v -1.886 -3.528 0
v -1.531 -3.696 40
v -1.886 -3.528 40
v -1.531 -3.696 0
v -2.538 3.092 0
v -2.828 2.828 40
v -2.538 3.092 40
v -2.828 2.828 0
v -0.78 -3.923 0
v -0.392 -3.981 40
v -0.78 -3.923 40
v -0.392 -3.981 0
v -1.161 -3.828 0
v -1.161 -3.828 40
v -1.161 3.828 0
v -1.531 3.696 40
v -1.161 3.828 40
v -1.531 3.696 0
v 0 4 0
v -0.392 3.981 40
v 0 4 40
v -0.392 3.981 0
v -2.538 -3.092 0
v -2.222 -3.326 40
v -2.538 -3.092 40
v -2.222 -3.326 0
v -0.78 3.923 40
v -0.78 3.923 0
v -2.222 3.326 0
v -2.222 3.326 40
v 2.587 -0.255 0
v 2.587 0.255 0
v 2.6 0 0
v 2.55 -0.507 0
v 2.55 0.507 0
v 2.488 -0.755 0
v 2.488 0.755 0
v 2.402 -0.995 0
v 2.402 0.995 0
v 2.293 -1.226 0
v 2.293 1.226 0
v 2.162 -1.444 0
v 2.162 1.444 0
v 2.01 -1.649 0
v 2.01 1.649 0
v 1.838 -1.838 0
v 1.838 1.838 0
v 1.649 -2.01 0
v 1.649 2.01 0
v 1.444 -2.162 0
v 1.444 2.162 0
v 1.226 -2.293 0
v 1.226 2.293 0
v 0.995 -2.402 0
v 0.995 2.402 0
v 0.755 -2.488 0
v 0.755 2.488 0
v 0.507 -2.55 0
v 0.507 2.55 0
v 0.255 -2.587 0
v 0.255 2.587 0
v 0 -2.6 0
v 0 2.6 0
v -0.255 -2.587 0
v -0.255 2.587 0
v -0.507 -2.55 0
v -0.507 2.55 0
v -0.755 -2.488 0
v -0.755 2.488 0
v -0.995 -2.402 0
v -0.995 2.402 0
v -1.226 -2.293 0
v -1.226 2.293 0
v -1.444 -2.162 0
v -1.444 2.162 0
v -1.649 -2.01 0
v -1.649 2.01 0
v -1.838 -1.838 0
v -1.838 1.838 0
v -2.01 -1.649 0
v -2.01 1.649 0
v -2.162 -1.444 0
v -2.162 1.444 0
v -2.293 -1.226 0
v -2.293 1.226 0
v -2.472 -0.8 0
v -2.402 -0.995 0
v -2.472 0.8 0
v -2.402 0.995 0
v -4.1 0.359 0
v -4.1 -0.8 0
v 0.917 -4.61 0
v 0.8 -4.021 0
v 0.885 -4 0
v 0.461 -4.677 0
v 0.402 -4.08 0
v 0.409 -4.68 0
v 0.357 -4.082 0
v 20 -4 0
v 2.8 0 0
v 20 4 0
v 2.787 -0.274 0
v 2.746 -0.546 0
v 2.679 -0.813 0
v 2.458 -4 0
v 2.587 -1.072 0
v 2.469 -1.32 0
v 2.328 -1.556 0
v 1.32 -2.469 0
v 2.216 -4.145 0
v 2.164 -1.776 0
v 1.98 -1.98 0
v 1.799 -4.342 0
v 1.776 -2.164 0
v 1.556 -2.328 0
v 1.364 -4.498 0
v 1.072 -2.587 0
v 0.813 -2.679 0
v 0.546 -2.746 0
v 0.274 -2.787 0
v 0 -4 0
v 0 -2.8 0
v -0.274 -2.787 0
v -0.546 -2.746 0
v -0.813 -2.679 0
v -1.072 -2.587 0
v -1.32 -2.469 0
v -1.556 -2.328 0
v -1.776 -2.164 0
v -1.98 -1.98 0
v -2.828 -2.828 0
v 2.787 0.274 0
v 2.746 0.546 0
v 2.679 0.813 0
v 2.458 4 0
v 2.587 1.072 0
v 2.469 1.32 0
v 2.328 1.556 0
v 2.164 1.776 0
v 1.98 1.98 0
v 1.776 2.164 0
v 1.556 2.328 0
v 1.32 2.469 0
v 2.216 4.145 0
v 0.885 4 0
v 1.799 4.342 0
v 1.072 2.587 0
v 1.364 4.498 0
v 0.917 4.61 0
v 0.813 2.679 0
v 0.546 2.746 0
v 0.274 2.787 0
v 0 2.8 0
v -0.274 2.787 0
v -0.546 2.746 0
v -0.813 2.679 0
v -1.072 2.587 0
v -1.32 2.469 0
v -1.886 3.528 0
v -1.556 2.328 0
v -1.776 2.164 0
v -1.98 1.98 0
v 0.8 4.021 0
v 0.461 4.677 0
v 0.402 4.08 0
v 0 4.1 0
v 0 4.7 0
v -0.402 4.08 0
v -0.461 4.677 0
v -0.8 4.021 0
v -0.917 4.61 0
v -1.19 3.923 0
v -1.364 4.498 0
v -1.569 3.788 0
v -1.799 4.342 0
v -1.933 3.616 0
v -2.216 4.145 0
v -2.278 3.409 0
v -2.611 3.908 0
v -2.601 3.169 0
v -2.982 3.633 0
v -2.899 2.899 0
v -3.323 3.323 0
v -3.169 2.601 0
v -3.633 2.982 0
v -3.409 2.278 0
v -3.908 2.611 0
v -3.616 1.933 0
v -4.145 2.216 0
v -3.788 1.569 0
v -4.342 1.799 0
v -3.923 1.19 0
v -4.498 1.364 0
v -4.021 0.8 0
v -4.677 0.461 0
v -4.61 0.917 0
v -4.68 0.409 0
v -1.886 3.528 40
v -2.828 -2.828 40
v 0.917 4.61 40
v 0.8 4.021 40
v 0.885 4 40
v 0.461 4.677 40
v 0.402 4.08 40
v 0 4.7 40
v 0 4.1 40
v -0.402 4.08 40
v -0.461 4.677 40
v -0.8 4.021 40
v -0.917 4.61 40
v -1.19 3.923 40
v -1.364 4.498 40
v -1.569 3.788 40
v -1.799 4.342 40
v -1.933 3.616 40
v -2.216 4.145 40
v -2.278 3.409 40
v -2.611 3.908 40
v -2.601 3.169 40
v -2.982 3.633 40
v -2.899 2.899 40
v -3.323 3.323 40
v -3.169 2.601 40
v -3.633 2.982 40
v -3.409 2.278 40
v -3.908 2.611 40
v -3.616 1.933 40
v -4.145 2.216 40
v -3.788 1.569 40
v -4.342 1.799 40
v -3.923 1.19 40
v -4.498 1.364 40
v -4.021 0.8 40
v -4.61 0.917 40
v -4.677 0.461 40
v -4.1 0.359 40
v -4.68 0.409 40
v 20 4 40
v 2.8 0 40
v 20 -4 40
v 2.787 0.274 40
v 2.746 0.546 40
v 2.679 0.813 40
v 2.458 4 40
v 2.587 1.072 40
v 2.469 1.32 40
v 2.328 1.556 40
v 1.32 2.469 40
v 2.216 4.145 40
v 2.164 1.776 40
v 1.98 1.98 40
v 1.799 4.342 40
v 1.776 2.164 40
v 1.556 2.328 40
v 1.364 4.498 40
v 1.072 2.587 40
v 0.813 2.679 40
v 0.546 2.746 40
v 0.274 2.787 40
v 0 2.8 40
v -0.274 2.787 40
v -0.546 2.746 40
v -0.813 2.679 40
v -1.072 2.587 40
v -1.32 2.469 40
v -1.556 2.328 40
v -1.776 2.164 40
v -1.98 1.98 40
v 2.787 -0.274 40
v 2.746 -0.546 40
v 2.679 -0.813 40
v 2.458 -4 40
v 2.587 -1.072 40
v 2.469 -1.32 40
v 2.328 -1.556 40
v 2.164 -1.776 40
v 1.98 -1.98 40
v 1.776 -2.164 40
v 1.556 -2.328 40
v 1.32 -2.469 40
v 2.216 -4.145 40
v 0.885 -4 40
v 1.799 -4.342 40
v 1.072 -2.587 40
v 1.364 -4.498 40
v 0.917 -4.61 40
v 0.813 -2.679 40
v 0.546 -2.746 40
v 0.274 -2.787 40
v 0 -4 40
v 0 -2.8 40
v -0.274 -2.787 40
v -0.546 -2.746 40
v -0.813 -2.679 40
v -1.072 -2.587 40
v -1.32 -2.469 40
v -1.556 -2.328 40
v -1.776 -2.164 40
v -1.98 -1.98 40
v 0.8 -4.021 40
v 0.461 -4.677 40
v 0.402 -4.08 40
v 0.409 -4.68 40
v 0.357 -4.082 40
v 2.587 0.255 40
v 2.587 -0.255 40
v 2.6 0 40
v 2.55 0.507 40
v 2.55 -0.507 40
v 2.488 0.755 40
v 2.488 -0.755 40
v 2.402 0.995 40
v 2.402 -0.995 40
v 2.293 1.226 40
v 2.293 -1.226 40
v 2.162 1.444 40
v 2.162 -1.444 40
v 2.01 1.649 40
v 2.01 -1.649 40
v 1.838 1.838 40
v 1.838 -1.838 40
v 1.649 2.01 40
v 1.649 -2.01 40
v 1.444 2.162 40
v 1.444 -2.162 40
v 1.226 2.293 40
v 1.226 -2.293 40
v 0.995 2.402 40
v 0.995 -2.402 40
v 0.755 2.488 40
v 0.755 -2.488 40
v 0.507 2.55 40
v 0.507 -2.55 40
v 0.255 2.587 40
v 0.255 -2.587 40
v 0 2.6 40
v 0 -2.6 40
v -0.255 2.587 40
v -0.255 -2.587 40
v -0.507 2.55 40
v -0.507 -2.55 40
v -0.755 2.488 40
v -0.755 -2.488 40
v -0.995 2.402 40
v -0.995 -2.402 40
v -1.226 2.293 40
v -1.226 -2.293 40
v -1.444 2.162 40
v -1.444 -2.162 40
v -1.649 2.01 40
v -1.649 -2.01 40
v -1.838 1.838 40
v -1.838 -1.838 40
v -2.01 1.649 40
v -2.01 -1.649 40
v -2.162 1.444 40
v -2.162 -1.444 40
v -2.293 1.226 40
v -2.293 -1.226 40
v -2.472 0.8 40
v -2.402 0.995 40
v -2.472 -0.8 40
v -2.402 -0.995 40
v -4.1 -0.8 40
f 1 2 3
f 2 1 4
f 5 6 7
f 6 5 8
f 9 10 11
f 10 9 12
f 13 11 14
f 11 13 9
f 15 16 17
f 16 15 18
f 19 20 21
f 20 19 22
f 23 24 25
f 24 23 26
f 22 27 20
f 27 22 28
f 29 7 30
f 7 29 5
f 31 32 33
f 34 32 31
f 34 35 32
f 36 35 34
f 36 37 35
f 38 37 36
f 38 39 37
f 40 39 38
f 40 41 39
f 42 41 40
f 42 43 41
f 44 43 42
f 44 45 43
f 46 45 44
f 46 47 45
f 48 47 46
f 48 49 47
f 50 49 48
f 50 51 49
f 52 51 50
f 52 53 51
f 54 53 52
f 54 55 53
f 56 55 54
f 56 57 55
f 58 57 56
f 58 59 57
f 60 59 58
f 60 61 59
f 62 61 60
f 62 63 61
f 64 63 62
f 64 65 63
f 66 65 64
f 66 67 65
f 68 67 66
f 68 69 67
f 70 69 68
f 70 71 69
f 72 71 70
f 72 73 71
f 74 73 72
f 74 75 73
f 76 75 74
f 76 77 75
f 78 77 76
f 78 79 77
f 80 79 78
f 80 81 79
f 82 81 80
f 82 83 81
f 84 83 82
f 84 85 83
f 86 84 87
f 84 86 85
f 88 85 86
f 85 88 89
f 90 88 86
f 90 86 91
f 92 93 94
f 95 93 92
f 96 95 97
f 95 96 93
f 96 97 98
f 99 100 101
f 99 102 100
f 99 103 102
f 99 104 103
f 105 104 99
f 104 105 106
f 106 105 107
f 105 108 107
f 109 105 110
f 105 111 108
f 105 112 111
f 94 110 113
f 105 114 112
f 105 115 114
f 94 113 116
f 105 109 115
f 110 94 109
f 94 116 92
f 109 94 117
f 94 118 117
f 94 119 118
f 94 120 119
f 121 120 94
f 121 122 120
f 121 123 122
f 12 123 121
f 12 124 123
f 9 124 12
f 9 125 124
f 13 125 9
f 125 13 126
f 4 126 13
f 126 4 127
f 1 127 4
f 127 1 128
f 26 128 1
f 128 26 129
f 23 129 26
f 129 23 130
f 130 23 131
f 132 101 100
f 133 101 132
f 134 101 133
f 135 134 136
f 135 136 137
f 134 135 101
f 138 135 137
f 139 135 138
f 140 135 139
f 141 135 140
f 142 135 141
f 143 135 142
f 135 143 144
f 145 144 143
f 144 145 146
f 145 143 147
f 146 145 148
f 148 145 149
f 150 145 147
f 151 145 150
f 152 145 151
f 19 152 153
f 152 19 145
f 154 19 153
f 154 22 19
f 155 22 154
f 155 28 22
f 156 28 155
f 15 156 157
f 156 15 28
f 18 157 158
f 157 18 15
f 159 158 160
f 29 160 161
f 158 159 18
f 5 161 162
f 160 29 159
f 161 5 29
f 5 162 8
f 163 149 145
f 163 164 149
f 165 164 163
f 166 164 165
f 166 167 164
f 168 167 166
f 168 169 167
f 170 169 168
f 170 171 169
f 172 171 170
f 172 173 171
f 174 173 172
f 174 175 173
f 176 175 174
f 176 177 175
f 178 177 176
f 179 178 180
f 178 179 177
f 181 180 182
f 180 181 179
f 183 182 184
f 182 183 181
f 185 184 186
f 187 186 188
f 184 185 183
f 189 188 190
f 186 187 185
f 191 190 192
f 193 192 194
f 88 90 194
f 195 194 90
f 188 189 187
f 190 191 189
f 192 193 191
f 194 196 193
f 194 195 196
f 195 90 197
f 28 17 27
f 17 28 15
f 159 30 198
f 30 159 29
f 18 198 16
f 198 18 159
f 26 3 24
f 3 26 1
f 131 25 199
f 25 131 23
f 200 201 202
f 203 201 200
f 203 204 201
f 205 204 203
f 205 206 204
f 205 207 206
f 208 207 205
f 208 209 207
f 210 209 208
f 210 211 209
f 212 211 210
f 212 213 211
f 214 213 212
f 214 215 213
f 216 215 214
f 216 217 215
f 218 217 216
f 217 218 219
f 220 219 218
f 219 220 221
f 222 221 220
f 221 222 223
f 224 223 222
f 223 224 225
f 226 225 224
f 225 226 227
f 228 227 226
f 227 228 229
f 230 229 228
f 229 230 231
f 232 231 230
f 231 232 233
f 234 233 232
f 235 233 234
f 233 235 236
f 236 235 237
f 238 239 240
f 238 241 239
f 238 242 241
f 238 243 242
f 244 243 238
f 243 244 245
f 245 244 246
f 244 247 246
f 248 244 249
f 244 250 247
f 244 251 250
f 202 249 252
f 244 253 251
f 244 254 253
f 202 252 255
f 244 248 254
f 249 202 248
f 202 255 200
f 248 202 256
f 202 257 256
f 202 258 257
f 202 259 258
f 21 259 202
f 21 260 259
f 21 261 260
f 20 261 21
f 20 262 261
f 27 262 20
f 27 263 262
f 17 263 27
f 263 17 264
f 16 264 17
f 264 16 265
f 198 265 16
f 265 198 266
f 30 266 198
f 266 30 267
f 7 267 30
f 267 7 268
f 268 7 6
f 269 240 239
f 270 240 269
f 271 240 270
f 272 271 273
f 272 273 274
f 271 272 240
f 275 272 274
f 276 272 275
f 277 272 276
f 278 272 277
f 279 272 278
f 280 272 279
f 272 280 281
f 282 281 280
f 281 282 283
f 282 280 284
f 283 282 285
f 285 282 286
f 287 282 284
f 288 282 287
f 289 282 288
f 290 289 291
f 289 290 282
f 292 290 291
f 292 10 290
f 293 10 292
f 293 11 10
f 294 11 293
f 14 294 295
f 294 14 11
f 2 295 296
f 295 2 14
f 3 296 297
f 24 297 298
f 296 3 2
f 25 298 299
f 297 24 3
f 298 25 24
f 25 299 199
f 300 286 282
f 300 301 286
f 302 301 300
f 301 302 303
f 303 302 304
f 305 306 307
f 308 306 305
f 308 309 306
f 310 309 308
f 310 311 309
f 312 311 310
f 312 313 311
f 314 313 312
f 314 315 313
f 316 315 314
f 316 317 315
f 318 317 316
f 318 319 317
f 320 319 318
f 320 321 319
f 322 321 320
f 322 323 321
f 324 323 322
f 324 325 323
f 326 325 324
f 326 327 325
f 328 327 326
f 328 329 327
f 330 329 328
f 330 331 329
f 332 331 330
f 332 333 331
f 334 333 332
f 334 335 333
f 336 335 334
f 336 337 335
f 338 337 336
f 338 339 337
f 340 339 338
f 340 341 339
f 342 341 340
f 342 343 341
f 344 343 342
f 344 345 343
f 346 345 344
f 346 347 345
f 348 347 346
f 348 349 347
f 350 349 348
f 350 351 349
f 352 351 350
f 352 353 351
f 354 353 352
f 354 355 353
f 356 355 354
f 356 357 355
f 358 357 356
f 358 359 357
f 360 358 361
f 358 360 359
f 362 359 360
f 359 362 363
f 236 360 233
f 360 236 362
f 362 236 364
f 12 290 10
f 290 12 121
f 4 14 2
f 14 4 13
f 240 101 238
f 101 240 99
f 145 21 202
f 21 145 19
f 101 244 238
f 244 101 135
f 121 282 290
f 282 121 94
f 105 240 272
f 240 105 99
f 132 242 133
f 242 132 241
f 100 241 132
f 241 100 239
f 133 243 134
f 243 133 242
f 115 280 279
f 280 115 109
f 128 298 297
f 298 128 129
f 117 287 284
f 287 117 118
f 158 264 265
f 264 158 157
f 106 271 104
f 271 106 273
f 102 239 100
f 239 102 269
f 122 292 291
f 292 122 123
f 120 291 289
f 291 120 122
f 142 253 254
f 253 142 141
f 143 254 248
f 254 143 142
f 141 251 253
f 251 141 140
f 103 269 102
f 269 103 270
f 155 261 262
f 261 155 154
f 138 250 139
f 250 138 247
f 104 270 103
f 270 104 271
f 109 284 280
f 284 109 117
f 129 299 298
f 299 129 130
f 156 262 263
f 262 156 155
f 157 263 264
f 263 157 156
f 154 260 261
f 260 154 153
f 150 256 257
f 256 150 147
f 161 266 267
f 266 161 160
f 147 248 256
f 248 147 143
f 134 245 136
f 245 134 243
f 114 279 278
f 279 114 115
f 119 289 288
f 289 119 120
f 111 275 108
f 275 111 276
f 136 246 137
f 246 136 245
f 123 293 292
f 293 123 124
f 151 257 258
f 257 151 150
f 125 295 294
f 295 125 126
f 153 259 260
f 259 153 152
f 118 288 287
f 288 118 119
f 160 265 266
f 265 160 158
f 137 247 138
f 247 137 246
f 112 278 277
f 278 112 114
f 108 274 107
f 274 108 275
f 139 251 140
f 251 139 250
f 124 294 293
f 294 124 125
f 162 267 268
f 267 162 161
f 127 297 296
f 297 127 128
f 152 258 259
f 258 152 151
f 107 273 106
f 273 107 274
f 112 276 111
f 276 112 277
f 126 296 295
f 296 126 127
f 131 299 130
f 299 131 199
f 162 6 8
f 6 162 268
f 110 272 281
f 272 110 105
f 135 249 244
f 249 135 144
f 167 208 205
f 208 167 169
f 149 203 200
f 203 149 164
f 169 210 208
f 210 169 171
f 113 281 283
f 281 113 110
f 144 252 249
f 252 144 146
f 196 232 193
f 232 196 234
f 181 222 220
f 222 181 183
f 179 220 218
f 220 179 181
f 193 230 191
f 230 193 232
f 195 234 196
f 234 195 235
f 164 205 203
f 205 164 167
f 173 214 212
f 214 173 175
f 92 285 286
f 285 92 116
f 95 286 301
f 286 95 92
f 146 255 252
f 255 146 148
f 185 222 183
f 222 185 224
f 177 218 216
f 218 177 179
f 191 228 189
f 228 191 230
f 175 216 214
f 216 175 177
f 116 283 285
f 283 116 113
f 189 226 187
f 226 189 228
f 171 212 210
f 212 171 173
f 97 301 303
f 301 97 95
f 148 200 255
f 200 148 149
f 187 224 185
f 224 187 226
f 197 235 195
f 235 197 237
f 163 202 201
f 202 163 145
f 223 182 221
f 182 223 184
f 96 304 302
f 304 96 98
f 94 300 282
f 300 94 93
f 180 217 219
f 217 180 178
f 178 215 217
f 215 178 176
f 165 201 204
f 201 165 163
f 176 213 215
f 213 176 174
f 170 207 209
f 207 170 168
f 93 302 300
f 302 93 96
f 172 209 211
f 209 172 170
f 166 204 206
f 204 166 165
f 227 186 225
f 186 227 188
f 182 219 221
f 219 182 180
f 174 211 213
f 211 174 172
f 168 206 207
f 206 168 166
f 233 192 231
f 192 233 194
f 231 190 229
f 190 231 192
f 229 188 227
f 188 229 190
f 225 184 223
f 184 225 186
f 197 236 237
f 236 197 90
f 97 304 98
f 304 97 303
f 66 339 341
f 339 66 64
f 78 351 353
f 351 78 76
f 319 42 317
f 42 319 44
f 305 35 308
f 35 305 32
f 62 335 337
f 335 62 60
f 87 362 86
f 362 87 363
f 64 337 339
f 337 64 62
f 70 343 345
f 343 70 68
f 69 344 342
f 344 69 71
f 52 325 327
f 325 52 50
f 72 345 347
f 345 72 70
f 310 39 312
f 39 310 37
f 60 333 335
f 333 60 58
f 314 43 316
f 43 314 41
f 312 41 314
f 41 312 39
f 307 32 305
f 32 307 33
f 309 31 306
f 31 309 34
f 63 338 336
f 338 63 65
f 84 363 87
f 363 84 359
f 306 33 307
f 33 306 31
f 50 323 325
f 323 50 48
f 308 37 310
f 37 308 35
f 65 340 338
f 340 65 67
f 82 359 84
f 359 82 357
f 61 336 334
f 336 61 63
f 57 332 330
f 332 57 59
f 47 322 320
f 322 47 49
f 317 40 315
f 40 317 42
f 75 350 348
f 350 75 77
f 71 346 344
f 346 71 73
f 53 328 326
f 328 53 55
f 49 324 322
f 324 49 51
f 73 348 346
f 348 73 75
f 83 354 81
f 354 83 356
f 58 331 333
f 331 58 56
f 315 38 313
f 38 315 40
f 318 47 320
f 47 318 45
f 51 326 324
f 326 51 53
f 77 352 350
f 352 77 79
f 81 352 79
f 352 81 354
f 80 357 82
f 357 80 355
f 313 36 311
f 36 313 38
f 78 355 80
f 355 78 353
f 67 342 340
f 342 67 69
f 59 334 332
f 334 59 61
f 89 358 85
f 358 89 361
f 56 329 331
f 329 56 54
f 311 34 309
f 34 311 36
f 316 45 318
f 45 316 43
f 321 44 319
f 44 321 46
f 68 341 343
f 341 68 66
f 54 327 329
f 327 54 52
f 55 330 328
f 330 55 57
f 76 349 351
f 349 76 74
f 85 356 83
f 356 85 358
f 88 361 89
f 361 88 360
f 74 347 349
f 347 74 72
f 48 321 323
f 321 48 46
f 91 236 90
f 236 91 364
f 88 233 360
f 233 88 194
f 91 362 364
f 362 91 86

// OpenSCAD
// c-hinge.scad

od        = 8.0;   // [mm] Außendurchmesser C-Clip
wall      = 1.2;   // [mm] Wandstärke C-Clip
h         = 40;    // [mm] Länge
clearance = 0.2;   // [mm] Spiel zwischen Stab und C-Clip (allseitig)

rod_od = od - 2*wall - 2*clearance;  // = 5.2 mm
fin_t  = 1.6;   // [mm] Dicke der Flosse (4 × 0.4mm Düse)

open_a   = 100;  // [°] Öffnungswinkel des Catch-Rings
open_dir = 225;  // [°] Richtung der Öffnungsmitte (0°=+X, 90°=+Y, 225°=unten-links)

$fn = 64;

// ── Hilfmodul: Kreissektor (Pie-Slice) ──────────────────────────
// entspricht einer 2D-Skizze mit Bogen, extrudiert auf Höhe h
module wedge(r, angle, height) {
    n = max(2, ceil(angle));
    linear_extrude(height)
        polygon(concat(
            [[0, 0]],
            [for (i = [0:n]) [r * cos(i * angle / n),
                              r * sin(i * angle / n)]]
        ));
}

// ── C-Clip (Ruder) ───────────────────────────────────────────────
color("gold")
difference() {
    union() {
        cylinder(d = od, h = h);
        translate([0, -od/2, 0])
            cube([20, od, h]);  
            }
    translate([0, 0, -0.1])
        cylinder(d = od - 2 * wall, h = h + 0.2);
    rotate([0, 0, -45])
        translate([-od, -od, -0.1])
            cube([8, 8, h + 0.2]);
}

// ── Stab (Flosse) ────────────────────────────────────────────────
color("steelblue")
union() {
    // center
    cylinder(d = rod_od, h = h);
    translate([-(od+clearance)/2, -fin_t/2, 0])
        cube([od/2, fin_t, h]);
    
    // catch
    difference() {
        cylinder(d = od+clearance+wall, h = h);
        // Innenbohrung
        translate([0, 0, -0.1])
            cylinder(d = od+clearance, h = h+0.2);
        // Öffnungsschnitt (Pie-Slice Wedge)
        translate([0, 0, -0.1])
            rotate([0, 0, open_dir - open_a/2])
                wedge(od + clearance + wall + 1, open_a, h + 0.2);
    }
}
